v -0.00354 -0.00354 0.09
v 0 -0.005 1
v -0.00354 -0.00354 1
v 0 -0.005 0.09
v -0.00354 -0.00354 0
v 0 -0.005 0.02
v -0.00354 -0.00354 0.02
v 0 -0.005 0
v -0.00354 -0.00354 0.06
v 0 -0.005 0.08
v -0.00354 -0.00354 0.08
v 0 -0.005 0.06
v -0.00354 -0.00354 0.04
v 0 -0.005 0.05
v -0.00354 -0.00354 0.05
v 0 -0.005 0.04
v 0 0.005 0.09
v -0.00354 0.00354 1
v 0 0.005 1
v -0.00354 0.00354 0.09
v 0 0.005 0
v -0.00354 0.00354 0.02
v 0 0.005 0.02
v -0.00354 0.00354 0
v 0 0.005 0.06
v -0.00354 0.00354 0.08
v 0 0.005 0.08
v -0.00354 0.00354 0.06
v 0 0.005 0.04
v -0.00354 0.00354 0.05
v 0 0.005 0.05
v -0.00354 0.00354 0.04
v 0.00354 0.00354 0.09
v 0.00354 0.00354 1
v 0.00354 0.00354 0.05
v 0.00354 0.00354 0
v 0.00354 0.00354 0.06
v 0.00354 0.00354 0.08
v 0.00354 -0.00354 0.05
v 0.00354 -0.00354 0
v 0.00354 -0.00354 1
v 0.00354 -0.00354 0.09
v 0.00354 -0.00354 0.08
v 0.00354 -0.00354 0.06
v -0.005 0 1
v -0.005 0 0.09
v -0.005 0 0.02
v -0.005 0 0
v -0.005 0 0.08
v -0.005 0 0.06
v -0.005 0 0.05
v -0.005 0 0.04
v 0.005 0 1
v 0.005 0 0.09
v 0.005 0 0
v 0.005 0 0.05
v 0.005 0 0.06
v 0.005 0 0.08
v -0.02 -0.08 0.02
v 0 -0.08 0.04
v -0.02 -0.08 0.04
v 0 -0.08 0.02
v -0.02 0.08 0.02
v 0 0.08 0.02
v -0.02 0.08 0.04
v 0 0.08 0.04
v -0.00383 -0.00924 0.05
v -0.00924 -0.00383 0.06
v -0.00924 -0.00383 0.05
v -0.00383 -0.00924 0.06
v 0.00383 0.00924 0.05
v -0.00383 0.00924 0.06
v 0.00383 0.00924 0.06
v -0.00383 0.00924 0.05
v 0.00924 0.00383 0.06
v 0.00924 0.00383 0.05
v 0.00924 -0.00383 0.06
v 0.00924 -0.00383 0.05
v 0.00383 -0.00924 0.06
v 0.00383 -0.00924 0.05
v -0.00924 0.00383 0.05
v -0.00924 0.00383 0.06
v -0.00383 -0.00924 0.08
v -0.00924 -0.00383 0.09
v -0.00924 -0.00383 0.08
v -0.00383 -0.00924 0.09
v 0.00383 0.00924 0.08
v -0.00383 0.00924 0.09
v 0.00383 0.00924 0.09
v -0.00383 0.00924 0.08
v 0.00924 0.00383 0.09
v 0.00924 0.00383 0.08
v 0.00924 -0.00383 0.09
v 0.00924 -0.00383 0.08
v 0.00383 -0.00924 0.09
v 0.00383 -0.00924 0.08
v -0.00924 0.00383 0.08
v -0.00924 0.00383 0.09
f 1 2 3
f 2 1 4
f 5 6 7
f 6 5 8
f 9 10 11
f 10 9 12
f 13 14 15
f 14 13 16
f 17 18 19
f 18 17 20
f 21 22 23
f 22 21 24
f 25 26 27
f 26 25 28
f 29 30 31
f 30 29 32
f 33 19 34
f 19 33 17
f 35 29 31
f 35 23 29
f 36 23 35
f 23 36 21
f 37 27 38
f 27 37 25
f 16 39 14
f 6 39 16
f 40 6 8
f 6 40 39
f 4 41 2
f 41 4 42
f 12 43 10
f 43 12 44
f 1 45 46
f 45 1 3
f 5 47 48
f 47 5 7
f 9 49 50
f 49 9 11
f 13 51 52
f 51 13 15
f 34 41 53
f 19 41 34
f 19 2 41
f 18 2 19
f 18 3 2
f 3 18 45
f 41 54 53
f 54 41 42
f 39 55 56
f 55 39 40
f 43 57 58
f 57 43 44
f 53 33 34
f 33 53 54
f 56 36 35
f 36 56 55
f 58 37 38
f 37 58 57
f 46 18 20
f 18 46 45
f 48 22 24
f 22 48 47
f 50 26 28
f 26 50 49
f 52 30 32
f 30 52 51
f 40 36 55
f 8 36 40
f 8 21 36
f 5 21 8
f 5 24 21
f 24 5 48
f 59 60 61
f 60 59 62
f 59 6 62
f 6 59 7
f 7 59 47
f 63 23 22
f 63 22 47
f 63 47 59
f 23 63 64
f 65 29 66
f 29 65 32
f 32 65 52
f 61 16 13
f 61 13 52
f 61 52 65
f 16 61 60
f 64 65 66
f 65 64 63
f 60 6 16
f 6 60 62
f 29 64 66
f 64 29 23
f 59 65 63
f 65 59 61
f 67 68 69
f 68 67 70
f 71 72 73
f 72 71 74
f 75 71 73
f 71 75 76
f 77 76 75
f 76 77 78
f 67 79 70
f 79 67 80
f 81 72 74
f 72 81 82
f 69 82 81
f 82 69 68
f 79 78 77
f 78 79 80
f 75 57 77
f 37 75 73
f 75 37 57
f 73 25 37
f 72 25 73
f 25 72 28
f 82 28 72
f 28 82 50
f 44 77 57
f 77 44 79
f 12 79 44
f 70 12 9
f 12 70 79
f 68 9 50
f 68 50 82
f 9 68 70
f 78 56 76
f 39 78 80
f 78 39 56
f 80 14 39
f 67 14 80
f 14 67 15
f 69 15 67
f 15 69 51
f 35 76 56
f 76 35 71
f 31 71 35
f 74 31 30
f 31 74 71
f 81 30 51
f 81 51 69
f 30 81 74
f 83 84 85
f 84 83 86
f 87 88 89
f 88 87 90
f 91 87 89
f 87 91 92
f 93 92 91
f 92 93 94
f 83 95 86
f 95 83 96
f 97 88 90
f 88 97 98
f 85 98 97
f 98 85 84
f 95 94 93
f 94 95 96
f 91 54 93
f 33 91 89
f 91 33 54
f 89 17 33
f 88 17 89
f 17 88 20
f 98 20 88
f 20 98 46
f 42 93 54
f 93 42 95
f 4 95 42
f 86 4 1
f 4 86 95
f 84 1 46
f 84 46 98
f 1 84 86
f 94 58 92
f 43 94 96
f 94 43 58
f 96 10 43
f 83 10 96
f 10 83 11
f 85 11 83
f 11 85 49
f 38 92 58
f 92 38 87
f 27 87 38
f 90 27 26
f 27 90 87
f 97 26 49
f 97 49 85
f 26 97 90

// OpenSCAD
module prismatic_rod() {
    rotate([0, 0, 45])
    scale([1, 1, 10])
    cylinder(h=0.1, r1=0.005, r2=0.005, $fn=8);
}

module rectangular_block() {
    translate([0, 0, 0.03])
    scale([1, 2, 1])
    hull() {
        translate([-0.01, -0.02, 0])
        cube([0.02, 0.04, 0.02], center=true);
        translate([-0.01, 0.02, 0])
        cube([0.02, 0.04, 0.02], center=true);
    }
}

module faceted_knob() {
    rotate([0, 0, 22.5])
    scale([1, 1, 1])
    cylinder(h=0.01, r1=0.01, r2=0.01, $fn=8);
}

module assembly() {
    union() {
        prismatic_rod();
        rectangular_block();
        translate([0, 0, 0.05])
        faceted_knob();
        translate([0, 0, 0.08])
        faceted_knob();
    }
}

assembly();
